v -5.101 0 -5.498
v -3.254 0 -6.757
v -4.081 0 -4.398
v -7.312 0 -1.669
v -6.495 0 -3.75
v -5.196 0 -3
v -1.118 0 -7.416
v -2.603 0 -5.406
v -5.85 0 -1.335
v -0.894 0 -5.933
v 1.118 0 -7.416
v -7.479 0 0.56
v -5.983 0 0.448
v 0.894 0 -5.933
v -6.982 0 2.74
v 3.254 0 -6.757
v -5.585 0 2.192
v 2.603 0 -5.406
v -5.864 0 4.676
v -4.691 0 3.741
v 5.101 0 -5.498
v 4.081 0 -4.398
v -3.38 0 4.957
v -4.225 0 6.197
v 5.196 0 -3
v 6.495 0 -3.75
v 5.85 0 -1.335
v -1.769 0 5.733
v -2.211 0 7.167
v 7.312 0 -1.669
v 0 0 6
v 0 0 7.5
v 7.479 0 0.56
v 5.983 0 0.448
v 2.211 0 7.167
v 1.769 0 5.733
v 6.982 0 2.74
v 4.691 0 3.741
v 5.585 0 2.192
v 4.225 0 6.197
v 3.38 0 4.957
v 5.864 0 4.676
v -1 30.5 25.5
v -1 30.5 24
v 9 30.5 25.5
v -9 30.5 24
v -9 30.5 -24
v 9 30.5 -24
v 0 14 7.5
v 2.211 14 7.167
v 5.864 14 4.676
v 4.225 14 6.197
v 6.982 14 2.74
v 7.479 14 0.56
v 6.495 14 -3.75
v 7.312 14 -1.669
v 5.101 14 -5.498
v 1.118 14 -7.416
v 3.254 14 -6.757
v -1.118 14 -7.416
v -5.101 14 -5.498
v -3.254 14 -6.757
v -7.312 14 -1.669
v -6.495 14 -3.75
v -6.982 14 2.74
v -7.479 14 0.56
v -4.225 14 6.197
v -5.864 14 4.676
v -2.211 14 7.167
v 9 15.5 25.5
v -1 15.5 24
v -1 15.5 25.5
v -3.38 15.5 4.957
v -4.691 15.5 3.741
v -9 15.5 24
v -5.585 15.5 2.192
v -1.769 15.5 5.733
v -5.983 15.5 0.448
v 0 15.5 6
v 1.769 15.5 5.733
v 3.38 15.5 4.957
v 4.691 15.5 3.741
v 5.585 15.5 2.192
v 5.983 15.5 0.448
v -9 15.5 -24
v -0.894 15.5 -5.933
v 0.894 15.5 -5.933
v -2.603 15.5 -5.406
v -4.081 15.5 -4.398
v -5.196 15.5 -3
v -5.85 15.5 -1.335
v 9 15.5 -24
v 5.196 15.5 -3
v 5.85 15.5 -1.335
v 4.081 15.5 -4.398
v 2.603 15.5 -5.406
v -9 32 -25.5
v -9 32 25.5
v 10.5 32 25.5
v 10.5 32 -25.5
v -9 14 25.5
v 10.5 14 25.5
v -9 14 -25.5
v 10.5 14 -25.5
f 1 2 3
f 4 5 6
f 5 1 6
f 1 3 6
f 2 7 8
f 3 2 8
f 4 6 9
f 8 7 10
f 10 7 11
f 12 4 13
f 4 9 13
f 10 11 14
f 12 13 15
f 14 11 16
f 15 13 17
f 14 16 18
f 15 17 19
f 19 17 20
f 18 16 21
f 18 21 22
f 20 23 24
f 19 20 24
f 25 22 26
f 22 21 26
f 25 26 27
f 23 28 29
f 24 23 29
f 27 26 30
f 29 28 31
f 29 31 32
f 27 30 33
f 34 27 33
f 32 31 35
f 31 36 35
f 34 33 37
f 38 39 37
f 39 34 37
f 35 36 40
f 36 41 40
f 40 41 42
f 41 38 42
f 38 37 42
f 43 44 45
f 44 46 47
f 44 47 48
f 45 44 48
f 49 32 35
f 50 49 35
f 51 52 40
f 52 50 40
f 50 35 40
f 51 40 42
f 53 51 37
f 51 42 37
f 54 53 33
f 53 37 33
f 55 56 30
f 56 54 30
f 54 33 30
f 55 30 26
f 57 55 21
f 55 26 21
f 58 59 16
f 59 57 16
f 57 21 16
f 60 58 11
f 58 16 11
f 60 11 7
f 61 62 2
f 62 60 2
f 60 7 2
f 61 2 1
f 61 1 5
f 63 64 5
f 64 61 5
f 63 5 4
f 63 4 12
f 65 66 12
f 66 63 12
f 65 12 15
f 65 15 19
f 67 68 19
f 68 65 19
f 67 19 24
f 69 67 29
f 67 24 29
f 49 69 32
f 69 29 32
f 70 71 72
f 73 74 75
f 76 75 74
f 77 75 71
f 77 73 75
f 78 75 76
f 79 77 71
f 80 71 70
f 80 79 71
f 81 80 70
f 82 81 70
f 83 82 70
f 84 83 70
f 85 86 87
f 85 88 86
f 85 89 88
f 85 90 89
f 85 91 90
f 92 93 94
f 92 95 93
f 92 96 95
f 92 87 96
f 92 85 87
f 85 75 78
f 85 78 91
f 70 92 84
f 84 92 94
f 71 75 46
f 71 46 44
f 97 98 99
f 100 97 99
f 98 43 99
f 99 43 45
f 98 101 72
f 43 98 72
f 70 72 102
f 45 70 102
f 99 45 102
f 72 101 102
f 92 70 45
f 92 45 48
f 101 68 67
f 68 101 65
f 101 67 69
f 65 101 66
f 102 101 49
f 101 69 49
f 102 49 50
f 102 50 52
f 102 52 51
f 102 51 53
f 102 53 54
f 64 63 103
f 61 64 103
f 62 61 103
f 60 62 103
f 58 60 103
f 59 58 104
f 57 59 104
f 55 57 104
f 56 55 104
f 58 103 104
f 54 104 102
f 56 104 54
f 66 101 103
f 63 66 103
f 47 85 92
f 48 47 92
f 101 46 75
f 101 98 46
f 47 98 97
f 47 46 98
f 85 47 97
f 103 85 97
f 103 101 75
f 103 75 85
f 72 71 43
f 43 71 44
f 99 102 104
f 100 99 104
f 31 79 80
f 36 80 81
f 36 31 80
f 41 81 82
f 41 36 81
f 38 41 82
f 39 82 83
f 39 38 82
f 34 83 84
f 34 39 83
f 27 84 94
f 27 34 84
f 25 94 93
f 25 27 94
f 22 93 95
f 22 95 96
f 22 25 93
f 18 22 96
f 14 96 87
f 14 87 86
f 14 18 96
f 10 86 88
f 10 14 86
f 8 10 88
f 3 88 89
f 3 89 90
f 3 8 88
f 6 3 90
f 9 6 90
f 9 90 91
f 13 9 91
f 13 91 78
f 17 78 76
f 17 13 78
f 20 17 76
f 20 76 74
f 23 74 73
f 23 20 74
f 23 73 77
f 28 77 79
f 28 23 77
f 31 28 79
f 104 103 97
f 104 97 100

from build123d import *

# Parameters (mm, degrees)
SKETCH_1_R          = 6
EXTRUDE_1_DEPTH     = 1.5
SKETCH_2_R          = 6
EXTRUDE_2_DEPTH     = 14
SKETCH_3_W          = 18
SKETCH_3_H          = 48
EXTRUDE_3_DEPTH     = 15
SHELL_3_T           = 1.5
SKETCH_4_W          = 10
SKETCH_4_H          = 15
CUT_EXTRUDE_1_DEPTH = 15


with BuildPart() as part:
    # 草图1 → 凸台-拉伸1 (new body)
    with BuildSketch(Plane(origin=(0, 0, 0), x_dir=(1, 0, 0), z_dir=(0, 1, 0))):
        with Locations(Location((0, 0, 0), (0, 0, 270))):
            Circle(SKETCH_1_R)
    extrude(amount=EXTRUDE_1_DEPTH)

    # 草图2 → 凸台-拉伸2 (add)
    with BuildSketch(Plane(origin=(0, 1.5, 0), x_dir=(1, 0, 0), z_dir=(0, 1, 0))):
        with Locations(Location((0, 0, 0), (0, 0, 270))):
            Circle(SKETCH_2_R)
    extrude(amount=EXTRUDE_2_DEPTH)

    # 草图3 → 凸台-拉伸3 (add)
    with BuildSketch(Plane(origin=(0, 15.5, 0), x_dir=(1, 0, 0), z_dir=(0, 1, 0))):
        Rectangle(SKETCH_3_W, SKETCH_3_H)
    extrude(amount=EXTRUDE_3_DEPTH)

    # 抽壳3
    shell_3_openings = [part.faces().sort_by_distance(p)[0] for p in [
        (-9, 23, 0),
        (0, 0, 0),
    ]]
    offset(amount=SHELL_3_T, openings=shell_3_openings, kind=Kind.INTERSECTION)

    # 草图4 → 切除-拉伸1 (cut)
    with BuildSketch(Plane(origin=(0, 0, 24), x_dir=(-1, 0, 0), z_dir=(0, 0, -1))):
        with Locations((-4, 23)):
            Rectangle(SKETCH_4_W, SKETCH_4_H)
    extrude(amount=-CUT_EXTRUDE_1_DEPTH, mode=Mode.SUBTRACT)


solid = part.part
